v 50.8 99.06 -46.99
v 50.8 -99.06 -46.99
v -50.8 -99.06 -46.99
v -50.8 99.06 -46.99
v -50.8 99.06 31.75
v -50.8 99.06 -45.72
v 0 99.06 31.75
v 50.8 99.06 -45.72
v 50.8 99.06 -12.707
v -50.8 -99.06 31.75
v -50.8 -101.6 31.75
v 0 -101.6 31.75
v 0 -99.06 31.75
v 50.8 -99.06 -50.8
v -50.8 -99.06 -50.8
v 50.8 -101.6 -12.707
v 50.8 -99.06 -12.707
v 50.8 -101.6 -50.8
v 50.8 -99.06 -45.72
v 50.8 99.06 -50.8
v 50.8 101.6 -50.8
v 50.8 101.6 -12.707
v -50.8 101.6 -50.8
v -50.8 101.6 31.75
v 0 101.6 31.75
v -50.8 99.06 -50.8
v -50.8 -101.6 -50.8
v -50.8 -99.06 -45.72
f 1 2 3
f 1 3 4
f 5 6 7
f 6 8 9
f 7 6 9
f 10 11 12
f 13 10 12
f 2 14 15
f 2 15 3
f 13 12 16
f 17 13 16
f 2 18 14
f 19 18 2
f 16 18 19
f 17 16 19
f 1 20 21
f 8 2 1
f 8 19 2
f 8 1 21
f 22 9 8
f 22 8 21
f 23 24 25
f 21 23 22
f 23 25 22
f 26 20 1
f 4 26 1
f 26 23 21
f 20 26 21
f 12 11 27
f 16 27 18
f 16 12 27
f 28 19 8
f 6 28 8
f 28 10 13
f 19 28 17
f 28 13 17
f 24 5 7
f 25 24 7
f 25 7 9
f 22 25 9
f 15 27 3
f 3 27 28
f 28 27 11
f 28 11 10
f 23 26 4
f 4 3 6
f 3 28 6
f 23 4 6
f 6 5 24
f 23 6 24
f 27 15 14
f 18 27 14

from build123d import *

# Parameters (mm, degrees)
F0_W     = 101.6
F0_H     = 203.2
F1_DEPTH = 50.8
F3_DEPTH = 203.201
F4_W     = 198.12
F4_H     = 33.0125290838
F4_H_2   = 3.81
F5_W     = 67.5063457778
F5_H     = 198.12
F6_DEPTH = 101.601


with BuildPart() as f1:
    # F0 (on Top) → F1 (new body, symmetric)
    with BuildSketch(Plane.XY):
        Rectangle(F0_W, F0_H)
    extrude(amount=F1_DEPTH, both=True)

    # F2 (on face) → F3 (cut, through all)
    with BuildSketch(Plane.XZ.offset(101.6)):
        Polygon((-50.8, 50.8), (-50.8, 31.75), (0, 31.75), (50.8, -12.7074709162), (50.8, 50.8), align=None)
    extrude(amount=-F3_DEPTH, mode=Mode.SUBTRACT)

    # F4 (on face) + F5 (on face) → F6 (cut, through all)
    with BuildSketch(Plane.YZ.offset(50.8)):
        with Locations((0, -29.2137354581)):
            Rectangle(F4_W, F4_H)
        with Locations((0, -48.895)):
            Rectangle(F4_W, F4_H_2)
    with BuildSketch(Plane(origin=(15.7348640799, 0, 17.9796798779), x_dir=(0.7525218469, 0, -0.6585672858), z_dir=(0.6585672858, 0, 0.7525218469))):
        with Locations((12.8436615633, 0)):
            Rectangle(F5_W, F5_H)
    extrude(amount=-F6_DEPTH, dir=(1, 0, 0), mode=Mode.SUBTRACT)


solid = f1.part
